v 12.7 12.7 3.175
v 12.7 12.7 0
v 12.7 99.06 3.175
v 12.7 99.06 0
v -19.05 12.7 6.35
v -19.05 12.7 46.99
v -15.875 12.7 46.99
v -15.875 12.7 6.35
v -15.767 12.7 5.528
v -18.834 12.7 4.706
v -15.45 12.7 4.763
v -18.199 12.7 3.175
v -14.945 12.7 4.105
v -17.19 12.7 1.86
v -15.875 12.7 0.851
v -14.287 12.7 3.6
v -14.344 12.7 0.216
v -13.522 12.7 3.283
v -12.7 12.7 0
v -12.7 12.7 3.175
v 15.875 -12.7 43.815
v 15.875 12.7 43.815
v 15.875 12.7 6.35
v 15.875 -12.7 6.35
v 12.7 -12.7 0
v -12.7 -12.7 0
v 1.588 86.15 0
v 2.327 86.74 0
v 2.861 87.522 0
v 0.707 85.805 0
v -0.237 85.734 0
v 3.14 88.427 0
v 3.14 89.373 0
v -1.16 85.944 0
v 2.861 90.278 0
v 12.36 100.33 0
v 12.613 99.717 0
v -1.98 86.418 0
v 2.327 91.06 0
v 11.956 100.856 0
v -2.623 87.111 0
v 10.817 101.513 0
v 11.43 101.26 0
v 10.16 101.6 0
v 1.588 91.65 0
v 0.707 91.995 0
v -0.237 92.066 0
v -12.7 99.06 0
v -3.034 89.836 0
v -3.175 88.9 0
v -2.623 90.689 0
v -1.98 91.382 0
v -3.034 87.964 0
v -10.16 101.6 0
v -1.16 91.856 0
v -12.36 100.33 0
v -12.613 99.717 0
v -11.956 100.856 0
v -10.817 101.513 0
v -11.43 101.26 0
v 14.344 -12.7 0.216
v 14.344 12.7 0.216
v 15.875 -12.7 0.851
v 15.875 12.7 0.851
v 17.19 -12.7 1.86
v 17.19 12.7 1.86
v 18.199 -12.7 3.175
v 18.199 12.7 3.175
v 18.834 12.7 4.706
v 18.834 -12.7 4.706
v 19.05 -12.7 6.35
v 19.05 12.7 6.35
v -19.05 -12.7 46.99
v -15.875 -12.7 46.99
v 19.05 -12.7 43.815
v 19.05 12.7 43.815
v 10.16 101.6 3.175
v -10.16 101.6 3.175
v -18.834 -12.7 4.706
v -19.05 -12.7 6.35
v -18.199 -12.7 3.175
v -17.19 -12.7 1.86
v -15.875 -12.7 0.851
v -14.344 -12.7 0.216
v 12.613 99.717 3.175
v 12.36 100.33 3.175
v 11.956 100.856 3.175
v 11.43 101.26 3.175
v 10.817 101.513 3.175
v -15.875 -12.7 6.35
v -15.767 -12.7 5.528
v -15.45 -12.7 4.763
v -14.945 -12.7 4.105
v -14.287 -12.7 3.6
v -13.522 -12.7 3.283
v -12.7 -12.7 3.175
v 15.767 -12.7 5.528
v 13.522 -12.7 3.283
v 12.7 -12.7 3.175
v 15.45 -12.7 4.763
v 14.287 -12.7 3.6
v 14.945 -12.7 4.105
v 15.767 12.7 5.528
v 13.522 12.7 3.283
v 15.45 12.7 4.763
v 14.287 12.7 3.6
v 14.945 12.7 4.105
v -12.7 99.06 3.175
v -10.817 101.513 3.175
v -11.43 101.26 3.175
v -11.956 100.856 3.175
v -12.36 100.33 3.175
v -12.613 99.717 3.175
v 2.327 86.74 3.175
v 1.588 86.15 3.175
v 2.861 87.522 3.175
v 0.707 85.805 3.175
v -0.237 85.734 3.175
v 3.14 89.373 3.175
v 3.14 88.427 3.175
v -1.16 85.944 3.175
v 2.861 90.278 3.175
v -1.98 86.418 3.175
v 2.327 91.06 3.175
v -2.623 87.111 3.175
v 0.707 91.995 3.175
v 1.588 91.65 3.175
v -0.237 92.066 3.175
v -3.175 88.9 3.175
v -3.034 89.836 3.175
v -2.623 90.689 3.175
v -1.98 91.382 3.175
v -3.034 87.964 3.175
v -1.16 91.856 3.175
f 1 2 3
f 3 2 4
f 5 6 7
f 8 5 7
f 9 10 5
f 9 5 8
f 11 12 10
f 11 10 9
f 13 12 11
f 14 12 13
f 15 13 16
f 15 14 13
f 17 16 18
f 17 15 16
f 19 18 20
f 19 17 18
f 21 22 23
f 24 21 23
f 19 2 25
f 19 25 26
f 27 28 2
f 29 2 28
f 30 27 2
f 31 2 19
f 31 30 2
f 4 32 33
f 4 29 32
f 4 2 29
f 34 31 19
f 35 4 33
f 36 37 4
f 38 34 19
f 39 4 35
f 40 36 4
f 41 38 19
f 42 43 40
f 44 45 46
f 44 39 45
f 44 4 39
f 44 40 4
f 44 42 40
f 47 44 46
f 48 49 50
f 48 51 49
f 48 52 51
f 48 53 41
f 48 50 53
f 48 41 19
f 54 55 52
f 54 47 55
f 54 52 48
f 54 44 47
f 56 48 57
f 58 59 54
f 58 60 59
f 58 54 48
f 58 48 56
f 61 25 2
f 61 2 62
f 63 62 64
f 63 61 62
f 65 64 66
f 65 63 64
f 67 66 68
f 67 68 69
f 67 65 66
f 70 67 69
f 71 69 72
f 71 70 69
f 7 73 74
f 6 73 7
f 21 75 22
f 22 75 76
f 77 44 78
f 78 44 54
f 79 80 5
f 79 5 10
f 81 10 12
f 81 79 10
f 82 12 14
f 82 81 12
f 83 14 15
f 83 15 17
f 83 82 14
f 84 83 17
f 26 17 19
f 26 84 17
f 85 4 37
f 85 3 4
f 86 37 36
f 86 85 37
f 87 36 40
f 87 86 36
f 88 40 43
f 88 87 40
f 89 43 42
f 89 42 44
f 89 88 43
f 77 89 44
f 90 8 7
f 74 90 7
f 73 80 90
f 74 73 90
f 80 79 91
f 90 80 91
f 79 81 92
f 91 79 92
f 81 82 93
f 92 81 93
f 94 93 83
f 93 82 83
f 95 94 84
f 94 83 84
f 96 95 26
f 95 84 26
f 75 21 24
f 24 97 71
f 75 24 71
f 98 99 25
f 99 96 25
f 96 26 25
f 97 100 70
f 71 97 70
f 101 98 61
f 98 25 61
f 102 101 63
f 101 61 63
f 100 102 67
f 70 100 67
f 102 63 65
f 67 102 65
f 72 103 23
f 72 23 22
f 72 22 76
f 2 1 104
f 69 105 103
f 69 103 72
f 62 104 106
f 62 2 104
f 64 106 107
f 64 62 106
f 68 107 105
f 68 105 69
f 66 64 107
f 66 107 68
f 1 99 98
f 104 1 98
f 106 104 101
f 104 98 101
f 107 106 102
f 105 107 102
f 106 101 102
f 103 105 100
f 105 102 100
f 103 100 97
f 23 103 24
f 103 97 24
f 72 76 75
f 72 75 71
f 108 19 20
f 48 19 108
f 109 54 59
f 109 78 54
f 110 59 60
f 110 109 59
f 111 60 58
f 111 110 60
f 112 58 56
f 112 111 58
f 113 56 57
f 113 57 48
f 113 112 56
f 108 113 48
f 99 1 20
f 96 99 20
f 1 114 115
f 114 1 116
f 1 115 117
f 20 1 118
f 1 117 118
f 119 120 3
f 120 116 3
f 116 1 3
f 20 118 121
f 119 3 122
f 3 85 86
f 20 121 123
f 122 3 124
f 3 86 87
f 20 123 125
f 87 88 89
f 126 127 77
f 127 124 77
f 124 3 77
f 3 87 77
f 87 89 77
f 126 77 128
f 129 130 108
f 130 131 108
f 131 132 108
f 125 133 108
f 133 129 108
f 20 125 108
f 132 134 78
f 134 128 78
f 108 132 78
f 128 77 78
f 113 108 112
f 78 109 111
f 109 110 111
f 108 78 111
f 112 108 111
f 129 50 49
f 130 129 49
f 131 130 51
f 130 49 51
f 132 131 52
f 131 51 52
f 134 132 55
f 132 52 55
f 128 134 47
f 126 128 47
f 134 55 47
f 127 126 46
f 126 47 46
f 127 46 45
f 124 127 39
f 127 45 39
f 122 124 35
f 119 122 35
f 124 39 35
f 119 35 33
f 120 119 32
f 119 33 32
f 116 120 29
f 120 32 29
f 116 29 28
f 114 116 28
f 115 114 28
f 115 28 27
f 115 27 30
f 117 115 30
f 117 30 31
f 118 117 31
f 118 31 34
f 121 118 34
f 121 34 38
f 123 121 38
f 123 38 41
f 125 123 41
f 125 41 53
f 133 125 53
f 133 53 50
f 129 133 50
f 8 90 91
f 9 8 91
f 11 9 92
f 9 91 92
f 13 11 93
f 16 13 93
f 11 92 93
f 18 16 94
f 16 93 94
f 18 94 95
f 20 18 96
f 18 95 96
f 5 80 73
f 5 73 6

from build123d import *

# Parameters (mm, degrees)
SKETCH2_W              = 38.1
SKETCH2_H              = 25.4
BOSS_EXTRUDE1_DEPTH    = 3.175
SKETCH20_W             = 46.99
SKETCH20_H             = 25.4
BOSS_EXTRUDE5_DEPTH    = 3.175
SKETCH25_W             = 43.815
SKETCH25_H             = 25.4
BOSS_EXTRUDE6_DEPTH    = 3.175
CONVERT_SOLID2_START   = -12.7
CONVERT_SOLID2_DEPTH   = 25.4
CONVERT_SOLID2_2_DEPTH = 25.4
SKETCH16_W             = 25.4
SKETCH16_H             = 88.9
BOSS_EXTRUDE3_DEPTH    = 3.175
SKETCH17_R             = 3.175
CUT_EXTRUDE1_DEPTH     = 114.549648172
FILLET1_R              = 2.54


# Read off the part's stored shape, not the designer's step: Convert-Solid2
with BuildPart() as part:
    # Sketch2 → Boss-Extrude1 (new body)
    with BuildSketch(Plane.XY):
        Rectangle(SKETCH2_W, SKETCH2_H)
    extrude(amount=BOSS_EXTRUDE1_DEPTH)

    # Sketch20 → Boss-Extrude5 (add)
    with BuildSketch(Plane.ZY.offset(19.05)):
        with Locations((23.495, 0)):
            Rectangle(SKETCH20_W, SKETCH20_H)
    extrude(amount=-BOSS_EXTRUDE5_DEPTH)

    # Sketch25 → Boss-Extrude6 (add)
    with BuildSketch(Plane(origin=(19.05, 0, 0), x_dir=(0, 0, -1), z_dir=(1, 0, 0))):
        with Locations((-21.9075, 0)):
            Rectangle(SKETCH25_W, SKETCH25_H)
    extrude(amount=-BOSS_EXTRUDE6_DEPTH)

    # Convert-Solid2 outline → Convert-Solid2 (cut)
    with BuildSketch(Plane(origin=(0, 0, 0), x_dir=(1, 0, 0), z_dir=(0, 1, 0)).offset(CONVERT_SOLID2_START)):
        with BuildLine():
            Line((19.05, 0), (12.7, 0))
            ThreePointArc((12.7, 0), (17.190128061, -1.859871939), (19.05, -6.35))
            Line((19.05, -6.35), (19.05, 0))
        make_face()
        with BuildLine():
            ThreePointArc((-19.05, -6.35), (-17.190128061, -1.859871939), (-12.7, 0))
            Line((-12.7, 0), (-19.05, 0))
            Line((-19.05, 0), (-19.05, -6.35))
        make_face()
    extrude(amount=CONVERT_SOLID2_DEPTH, mode=Mode.SUBTRACT)

    # Convert-Solid2 2 outline → Convert-Solid2 2 (add)
    with BuildSketch(Plane(origin=(0, 0, 0), x_dir=(1, 0, 0), z_dir=(0, 1, 0)).offset(CONVERT_SOLID2_START)):
        with BuildLine():
            Line((15.875, -3.175), (12.7, -3.175))
            ThreePointArc((12.7, -3.175), (14.94506403, -4.10493597), (15.875, -6.35))
            Line((15.875, -6.35), (15.875, -3.175))
        make_face()
        with BuildLine():
            ThreePointArc((-15.875, -6.35), (-14.94506403, -4.10493597), (-12.7, -3.175))
            Line((-12.7, -3.175), (-15.875, -3.175))
            Line((-15.875, -3.175), (-15.875, -6.35))
        make_face()
    extrude(amount=CONVERT_SOLID2_2_DEPTH)

    # Sketch16 → Boss-Extrude3 (add)
    with BuildSketch(Plane(origin=(0, 0, 0), x_dir=(-1, 0, 0), z_dir=(0, 0, -1))):
        with Locations((0, 57.15)):
            Rectangle(SKETCH16_W, SKETCH16_H)
    extrude(amount=-BOSS_EXTRUDE3_DEPTH)

    # Sketch17 → Cut-Extrude1 (cut, through all)
    with BuildSketch(Plane(origin=(0, 0, 0), x_dir=(-1, 0, 0), z_dir=(0, 0, -1))):
        with Locations((0, 88.9)):
            Circle(SKETCH17_R)
    extrude(amount=-CUT_EXTRUDE1_DEPTH, mode=Mode.SUBTRACT)

    # Fillet1
    fillet1_edges = [part.edges().sort_by_distance(p)[0] for p in [
        (12.7, 101.6, 1.5875),
        (-12.7, 101.6, 1.5875),
    ]]
    fillet(fillet1_edges, radius=FILLET1_R)


solid = part.part
